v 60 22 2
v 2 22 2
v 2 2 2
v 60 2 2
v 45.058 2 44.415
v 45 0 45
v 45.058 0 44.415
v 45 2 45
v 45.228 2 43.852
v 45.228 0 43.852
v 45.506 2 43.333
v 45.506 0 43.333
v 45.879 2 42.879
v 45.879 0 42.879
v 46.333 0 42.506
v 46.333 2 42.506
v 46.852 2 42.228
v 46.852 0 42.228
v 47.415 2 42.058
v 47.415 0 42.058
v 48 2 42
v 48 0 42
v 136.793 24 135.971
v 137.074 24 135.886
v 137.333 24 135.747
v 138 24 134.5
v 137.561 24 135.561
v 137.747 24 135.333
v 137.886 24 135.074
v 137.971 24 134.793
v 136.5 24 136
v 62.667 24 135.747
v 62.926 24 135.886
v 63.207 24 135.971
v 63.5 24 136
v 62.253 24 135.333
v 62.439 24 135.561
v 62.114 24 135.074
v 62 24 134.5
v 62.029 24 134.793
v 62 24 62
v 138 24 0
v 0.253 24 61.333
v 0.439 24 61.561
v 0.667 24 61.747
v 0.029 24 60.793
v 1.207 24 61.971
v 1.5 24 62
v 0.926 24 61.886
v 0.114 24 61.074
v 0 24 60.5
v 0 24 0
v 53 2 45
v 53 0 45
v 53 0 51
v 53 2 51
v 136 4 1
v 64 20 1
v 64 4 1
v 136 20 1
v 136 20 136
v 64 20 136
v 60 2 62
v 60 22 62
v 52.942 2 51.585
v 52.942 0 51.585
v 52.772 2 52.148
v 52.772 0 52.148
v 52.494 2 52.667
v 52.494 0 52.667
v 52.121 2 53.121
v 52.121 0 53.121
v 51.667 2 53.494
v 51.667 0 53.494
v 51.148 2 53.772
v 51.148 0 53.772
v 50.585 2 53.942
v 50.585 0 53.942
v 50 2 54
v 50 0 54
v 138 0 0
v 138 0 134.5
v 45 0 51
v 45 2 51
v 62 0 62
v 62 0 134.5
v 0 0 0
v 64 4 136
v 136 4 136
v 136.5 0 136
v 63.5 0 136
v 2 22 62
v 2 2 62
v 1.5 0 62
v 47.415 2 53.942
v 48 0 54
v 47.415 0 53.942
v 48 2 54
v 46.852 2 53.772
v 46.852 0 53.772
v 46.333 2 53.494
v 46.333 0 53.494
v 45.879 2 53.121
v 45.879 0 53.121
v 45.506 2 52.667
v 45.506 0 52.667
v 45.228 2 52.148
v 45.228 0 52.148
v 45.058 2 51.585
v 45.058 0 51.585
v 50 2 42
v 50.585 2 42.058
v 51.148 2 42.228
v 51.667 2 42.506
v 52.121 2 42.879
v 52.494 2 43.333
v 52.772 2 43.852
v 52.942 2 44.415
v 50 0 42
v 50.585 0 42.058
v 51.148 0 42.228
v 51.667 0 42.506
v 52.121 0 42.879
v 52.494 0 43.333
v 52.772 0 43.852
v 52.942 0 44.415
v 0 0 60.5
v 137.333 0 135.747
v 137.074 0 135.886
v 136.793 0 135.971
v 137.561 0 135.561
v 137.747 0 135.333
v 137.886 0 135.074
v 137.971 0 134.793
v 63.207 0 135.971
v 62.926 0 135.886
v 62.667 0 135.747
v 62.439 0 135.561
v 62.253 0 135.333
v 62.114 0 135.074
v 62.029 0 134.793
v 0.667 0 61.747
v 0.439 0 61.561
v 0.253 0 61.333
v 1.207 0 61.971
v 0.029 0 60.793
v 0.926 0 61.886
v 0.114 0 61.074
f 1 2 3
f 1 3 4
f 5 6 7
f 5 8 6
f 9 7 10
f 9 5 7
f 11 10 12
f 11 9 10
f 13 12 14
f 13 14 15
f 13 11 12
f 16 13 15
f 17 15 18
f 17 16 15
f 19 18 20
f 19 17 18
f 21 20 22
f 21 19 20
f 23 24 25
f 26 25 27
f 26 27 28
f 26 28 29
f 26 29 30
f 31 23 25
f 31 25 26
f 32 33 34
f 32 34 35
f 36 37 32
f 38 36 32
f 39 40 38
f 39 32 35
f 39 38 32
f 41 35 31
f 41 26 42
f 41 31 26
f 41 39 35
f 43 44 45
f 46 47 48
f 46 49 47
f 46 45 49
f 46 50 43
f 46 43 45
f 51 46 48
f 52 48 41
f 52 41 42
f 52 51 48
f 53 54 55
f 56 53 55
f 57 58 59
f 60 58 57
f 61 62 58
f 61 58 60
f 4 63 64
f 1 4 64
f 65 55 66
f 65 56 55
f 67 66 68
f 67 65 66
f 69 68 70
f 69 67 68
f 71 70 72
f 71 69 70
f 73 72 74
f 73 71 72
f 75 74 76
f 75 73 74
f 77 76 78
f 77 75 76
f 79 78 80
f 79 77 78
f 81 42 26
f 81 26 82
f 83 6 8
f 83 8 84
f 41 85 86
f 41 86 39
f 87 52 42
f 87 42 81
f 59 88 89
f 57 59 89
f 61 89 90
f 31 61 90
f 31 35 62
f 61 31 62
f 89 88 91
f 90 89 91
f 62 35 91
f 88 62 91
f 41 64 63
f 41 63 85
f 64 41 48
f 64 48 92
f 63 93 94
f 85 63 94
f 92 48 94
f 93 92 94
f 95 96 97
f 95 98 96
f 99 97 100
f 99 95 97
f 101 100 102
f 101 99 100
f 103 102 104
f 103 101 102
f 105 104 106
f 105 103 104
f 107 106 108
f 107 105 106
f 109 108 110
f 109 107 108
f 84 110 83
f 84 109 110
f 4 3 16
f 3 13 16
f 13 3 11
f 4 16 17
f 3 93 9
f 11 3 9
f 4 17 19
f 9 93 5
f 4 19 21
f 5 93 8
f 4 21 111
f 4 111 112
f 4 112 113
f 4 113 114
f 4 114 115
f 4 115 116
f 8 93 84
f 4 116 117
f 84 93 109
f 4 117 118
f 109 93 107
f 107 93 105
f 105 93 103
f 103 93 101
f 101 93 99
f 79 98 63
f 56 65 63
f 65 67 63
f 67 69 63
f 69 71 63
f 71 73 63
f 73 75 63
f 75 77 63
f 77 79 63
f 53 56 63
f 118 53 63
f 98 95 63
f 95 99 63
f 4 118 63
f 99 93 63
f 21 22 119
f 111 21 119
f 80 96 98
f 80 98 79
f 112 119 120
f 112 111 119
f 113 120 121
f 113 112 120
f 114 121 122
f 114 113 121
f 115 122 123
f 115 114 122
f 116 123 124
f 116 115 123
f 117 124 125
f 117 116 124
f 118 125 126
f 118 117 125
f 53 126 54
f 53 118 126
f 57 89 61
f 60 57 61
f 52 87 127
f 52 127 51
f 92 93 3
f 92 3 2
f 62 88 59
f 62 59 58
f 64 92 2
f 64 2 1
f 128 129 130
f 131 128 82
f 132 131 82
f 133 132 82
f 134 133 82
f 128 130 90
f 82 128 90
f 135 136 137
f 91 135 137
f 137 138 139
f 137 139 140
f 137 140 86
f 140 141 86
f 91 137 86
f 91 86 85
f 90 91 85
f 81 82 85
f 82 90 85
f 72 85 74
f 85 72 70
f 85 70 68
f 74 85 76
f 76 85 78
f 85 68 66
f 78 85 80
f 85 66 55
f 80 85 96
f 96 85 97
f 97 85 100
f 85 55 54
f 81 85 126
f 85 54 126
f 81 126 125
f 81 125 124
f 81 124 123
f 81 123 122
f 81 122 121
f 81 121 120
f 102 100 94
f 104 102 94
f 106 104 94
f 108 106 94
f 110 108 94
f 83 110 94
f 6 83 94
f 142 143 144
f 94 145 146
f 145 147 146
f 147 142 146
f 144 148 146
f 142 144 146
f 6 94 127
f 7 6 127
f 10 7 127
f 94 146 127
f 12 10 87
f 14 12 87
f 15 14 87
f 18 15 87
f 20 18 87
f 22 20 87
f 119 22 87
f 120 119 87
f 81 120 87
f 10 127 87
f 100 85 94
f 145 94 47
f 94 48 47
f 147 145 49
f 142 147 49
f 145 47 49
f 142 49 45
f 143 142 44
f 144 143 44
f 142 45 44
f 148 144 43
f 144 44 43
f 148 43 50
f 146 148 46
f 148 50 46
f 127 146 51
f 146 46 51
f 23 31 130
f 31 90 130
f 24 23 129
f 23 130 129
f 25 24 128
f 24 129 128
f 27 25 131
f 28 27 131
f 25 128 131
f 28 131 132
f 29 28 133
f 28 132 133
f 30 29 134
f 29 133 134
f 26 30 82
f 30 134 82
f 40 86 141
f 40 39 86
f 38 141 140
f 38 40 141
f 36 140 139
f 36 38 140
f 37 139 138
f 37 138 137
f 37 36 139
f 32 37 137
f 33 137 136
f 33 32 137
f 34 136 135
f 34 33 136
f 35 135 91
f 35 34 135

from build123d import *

# Parameters (mm, degrees)
SKETCH_W          = 62
SKETCH_H          = 24
PAD_DEPTH         = 62
SKETCH001_W       = 58
SKETCH001_H       = 20
POCKET_DEPTH      = 60
SKETCH002_W       = 8
SKETCH002_H       = 12
POCKET001_DEPTH   = 2
POCKET001_FACE5_W = 24
POCKET001_FACE5_H = 62
PAD001_DEPTH      = 74
PAD001_FACE12_W   = 24
PAD001_FACE12_H   = 74
PAD002_DEPTH      = 74
PAD002_FACE18_W   = 24
PAD002_FACE18_H   = 62
PAD003_DEPTH      = 2
PAD003_FACE24_W   = 24
PAD003_FACE24_H   = 74
PAD004_DEPTH      = 2
SKETCH003_W       = 72
SKETCH003_H       = 16
POCKET002_DEPTH   = 135
FILLET_R          = 3
FILLET001_R       = 3
FILLET002_R       = 3
FILLET003_R       = 3
FILLET004_R       = 1.5
FILLET005_R       = 1.5
FILLET006_R       = 1.5


with BuildPart() as part:
    # Sketch → Pad (new body)
    with BuildSketch(Plane.XY):
        with Locations((31, 12)):
            Rectangle(SKETCH_W, SKETCH_H)
    extrude(amount=PAD_DEPTH)

    # Sketch001 (on Face6 of Pad) → Pocket (cut)
    with BuildSketch(Plane.XY.offset(62)):
        with Locations((31, 12)):
            Rectangle(SKETCH001_W, SKETCH001_H)
    extrude(amount=-POCKET_DEPTH, mode=Mode.SUBTRACT)

    # Sketch002 (on Face1 of Pocket) → Pocket001 (cut)
    with BuildSketch(Plane.XZ):
        with Locations((49, 48)):
            Rectangle(SKETCH002_W, SKETCH002_H)
    extrude(amount=-POCKET001_DEPTH, mode=Mode.SUBTRACT)

    # Pocket001 Face5 → Pad001 (add)
    with BuildSketch(Plane(origin=(62, 12, 31), x_dir=(0, -1, 0), z_dir=(1, 0, 0))):
        Rectangle(POCKET001_FACE5_W, POCKET001_FACE5_H)
    extrude(amount=PAD001_DEPTH)

    # Pad001 Face12 → Pad002 (add)
    with BuildSketch(Plane(origin=(99, 12, 62), x_dir=(0, 1, 0), z_dir=(0, 0, 1))):
        Rectangle(PAD001_FACE12_W, PAD001_FACE12_H)
    extrude(amount=PAD002_DEPTH)

    # Pad002 Face18 → Pad003 (add)
    with BuildSketch(Plane(origin=(136, 12, 31), x_dir=(0, -1, 0), z_dir=(1, 0, 0))):
        Rectangle(PAD002_FACE18_W, PAD002_FACE18_H)
    extrude(amount=PAD003_DEPTH)

    # Pad003 Face24 → Pad004 (add)
    with BuildSketch(Plane(origin=(136, 12, 99), x_dir=(0, -1, 0), z_dir=(1, 0, 0))):
        Rectangle(PAD003_FACE24_W, PAD003_FACE24_H)
    extrude(amount=PAD004_DEPTH)

    # Sketch003 (on Face21 of Pad002) → Pocket002 (cut)
    with BuildSketch(Plane.XY.offset(136)):
        with Locations((100, 12)):
            Rectangle(SKETCH003_W, SKETCH003_H)
    extrude(amount=-POCKET002_DEPTH, mode=Mode.SUBTRACT)

    # Fillet
    fillet_edges = [part.edges().sort_by_distance(p)[0] for p in [
        (45, 1, 42),
    ]]
    fillet(fillet_edges, radius=FILLET_R)

    # Fillet001
    fillet001_edges = [part.edges().sort_by_distance(p)[0] for p in [
        (53, 1, 42),
    ]]
    fillet(fillet001_edges, radius=FILLET001_R)

    # Fillet002
    fillet002_edges = [part.edges().sort_by_distance(p)[0] for p in [
        (53, 1, 54),
    ]]
    fillet(fillet002_edges, radius=FILLET002_R)

    # Fillet003
    fillet003_edges = [part.edges().sort_by_distance(p)[0] for p in [
        (45, 1, 54),
    ]]
    fillet(fillet003_edges, radius=FILLET003_R)

    # Fillet004
    fillet004_edges = [part.edges().sort_by_distance(p)[0] for p in [
        (62, 12, 136),
    ]]
    fillet(fillet004_edges, radius=FILLET004_R)

    # Fillet005
    fillet005_edges = [part.edges().sort_by_distance(p)[0] for p in [
        (138, 12, 136),
    ]]
    fillet(fillet005_edges, radius=FILLET005_R)

    # Fillet006
    fillet006_edges = [part.edges().sort_by_distance(p)[0] for p in [
        (0, 12, 62),
    ]]
    fillet(fillet006_edges, radius=FILLET006_R)


solid = part.part
